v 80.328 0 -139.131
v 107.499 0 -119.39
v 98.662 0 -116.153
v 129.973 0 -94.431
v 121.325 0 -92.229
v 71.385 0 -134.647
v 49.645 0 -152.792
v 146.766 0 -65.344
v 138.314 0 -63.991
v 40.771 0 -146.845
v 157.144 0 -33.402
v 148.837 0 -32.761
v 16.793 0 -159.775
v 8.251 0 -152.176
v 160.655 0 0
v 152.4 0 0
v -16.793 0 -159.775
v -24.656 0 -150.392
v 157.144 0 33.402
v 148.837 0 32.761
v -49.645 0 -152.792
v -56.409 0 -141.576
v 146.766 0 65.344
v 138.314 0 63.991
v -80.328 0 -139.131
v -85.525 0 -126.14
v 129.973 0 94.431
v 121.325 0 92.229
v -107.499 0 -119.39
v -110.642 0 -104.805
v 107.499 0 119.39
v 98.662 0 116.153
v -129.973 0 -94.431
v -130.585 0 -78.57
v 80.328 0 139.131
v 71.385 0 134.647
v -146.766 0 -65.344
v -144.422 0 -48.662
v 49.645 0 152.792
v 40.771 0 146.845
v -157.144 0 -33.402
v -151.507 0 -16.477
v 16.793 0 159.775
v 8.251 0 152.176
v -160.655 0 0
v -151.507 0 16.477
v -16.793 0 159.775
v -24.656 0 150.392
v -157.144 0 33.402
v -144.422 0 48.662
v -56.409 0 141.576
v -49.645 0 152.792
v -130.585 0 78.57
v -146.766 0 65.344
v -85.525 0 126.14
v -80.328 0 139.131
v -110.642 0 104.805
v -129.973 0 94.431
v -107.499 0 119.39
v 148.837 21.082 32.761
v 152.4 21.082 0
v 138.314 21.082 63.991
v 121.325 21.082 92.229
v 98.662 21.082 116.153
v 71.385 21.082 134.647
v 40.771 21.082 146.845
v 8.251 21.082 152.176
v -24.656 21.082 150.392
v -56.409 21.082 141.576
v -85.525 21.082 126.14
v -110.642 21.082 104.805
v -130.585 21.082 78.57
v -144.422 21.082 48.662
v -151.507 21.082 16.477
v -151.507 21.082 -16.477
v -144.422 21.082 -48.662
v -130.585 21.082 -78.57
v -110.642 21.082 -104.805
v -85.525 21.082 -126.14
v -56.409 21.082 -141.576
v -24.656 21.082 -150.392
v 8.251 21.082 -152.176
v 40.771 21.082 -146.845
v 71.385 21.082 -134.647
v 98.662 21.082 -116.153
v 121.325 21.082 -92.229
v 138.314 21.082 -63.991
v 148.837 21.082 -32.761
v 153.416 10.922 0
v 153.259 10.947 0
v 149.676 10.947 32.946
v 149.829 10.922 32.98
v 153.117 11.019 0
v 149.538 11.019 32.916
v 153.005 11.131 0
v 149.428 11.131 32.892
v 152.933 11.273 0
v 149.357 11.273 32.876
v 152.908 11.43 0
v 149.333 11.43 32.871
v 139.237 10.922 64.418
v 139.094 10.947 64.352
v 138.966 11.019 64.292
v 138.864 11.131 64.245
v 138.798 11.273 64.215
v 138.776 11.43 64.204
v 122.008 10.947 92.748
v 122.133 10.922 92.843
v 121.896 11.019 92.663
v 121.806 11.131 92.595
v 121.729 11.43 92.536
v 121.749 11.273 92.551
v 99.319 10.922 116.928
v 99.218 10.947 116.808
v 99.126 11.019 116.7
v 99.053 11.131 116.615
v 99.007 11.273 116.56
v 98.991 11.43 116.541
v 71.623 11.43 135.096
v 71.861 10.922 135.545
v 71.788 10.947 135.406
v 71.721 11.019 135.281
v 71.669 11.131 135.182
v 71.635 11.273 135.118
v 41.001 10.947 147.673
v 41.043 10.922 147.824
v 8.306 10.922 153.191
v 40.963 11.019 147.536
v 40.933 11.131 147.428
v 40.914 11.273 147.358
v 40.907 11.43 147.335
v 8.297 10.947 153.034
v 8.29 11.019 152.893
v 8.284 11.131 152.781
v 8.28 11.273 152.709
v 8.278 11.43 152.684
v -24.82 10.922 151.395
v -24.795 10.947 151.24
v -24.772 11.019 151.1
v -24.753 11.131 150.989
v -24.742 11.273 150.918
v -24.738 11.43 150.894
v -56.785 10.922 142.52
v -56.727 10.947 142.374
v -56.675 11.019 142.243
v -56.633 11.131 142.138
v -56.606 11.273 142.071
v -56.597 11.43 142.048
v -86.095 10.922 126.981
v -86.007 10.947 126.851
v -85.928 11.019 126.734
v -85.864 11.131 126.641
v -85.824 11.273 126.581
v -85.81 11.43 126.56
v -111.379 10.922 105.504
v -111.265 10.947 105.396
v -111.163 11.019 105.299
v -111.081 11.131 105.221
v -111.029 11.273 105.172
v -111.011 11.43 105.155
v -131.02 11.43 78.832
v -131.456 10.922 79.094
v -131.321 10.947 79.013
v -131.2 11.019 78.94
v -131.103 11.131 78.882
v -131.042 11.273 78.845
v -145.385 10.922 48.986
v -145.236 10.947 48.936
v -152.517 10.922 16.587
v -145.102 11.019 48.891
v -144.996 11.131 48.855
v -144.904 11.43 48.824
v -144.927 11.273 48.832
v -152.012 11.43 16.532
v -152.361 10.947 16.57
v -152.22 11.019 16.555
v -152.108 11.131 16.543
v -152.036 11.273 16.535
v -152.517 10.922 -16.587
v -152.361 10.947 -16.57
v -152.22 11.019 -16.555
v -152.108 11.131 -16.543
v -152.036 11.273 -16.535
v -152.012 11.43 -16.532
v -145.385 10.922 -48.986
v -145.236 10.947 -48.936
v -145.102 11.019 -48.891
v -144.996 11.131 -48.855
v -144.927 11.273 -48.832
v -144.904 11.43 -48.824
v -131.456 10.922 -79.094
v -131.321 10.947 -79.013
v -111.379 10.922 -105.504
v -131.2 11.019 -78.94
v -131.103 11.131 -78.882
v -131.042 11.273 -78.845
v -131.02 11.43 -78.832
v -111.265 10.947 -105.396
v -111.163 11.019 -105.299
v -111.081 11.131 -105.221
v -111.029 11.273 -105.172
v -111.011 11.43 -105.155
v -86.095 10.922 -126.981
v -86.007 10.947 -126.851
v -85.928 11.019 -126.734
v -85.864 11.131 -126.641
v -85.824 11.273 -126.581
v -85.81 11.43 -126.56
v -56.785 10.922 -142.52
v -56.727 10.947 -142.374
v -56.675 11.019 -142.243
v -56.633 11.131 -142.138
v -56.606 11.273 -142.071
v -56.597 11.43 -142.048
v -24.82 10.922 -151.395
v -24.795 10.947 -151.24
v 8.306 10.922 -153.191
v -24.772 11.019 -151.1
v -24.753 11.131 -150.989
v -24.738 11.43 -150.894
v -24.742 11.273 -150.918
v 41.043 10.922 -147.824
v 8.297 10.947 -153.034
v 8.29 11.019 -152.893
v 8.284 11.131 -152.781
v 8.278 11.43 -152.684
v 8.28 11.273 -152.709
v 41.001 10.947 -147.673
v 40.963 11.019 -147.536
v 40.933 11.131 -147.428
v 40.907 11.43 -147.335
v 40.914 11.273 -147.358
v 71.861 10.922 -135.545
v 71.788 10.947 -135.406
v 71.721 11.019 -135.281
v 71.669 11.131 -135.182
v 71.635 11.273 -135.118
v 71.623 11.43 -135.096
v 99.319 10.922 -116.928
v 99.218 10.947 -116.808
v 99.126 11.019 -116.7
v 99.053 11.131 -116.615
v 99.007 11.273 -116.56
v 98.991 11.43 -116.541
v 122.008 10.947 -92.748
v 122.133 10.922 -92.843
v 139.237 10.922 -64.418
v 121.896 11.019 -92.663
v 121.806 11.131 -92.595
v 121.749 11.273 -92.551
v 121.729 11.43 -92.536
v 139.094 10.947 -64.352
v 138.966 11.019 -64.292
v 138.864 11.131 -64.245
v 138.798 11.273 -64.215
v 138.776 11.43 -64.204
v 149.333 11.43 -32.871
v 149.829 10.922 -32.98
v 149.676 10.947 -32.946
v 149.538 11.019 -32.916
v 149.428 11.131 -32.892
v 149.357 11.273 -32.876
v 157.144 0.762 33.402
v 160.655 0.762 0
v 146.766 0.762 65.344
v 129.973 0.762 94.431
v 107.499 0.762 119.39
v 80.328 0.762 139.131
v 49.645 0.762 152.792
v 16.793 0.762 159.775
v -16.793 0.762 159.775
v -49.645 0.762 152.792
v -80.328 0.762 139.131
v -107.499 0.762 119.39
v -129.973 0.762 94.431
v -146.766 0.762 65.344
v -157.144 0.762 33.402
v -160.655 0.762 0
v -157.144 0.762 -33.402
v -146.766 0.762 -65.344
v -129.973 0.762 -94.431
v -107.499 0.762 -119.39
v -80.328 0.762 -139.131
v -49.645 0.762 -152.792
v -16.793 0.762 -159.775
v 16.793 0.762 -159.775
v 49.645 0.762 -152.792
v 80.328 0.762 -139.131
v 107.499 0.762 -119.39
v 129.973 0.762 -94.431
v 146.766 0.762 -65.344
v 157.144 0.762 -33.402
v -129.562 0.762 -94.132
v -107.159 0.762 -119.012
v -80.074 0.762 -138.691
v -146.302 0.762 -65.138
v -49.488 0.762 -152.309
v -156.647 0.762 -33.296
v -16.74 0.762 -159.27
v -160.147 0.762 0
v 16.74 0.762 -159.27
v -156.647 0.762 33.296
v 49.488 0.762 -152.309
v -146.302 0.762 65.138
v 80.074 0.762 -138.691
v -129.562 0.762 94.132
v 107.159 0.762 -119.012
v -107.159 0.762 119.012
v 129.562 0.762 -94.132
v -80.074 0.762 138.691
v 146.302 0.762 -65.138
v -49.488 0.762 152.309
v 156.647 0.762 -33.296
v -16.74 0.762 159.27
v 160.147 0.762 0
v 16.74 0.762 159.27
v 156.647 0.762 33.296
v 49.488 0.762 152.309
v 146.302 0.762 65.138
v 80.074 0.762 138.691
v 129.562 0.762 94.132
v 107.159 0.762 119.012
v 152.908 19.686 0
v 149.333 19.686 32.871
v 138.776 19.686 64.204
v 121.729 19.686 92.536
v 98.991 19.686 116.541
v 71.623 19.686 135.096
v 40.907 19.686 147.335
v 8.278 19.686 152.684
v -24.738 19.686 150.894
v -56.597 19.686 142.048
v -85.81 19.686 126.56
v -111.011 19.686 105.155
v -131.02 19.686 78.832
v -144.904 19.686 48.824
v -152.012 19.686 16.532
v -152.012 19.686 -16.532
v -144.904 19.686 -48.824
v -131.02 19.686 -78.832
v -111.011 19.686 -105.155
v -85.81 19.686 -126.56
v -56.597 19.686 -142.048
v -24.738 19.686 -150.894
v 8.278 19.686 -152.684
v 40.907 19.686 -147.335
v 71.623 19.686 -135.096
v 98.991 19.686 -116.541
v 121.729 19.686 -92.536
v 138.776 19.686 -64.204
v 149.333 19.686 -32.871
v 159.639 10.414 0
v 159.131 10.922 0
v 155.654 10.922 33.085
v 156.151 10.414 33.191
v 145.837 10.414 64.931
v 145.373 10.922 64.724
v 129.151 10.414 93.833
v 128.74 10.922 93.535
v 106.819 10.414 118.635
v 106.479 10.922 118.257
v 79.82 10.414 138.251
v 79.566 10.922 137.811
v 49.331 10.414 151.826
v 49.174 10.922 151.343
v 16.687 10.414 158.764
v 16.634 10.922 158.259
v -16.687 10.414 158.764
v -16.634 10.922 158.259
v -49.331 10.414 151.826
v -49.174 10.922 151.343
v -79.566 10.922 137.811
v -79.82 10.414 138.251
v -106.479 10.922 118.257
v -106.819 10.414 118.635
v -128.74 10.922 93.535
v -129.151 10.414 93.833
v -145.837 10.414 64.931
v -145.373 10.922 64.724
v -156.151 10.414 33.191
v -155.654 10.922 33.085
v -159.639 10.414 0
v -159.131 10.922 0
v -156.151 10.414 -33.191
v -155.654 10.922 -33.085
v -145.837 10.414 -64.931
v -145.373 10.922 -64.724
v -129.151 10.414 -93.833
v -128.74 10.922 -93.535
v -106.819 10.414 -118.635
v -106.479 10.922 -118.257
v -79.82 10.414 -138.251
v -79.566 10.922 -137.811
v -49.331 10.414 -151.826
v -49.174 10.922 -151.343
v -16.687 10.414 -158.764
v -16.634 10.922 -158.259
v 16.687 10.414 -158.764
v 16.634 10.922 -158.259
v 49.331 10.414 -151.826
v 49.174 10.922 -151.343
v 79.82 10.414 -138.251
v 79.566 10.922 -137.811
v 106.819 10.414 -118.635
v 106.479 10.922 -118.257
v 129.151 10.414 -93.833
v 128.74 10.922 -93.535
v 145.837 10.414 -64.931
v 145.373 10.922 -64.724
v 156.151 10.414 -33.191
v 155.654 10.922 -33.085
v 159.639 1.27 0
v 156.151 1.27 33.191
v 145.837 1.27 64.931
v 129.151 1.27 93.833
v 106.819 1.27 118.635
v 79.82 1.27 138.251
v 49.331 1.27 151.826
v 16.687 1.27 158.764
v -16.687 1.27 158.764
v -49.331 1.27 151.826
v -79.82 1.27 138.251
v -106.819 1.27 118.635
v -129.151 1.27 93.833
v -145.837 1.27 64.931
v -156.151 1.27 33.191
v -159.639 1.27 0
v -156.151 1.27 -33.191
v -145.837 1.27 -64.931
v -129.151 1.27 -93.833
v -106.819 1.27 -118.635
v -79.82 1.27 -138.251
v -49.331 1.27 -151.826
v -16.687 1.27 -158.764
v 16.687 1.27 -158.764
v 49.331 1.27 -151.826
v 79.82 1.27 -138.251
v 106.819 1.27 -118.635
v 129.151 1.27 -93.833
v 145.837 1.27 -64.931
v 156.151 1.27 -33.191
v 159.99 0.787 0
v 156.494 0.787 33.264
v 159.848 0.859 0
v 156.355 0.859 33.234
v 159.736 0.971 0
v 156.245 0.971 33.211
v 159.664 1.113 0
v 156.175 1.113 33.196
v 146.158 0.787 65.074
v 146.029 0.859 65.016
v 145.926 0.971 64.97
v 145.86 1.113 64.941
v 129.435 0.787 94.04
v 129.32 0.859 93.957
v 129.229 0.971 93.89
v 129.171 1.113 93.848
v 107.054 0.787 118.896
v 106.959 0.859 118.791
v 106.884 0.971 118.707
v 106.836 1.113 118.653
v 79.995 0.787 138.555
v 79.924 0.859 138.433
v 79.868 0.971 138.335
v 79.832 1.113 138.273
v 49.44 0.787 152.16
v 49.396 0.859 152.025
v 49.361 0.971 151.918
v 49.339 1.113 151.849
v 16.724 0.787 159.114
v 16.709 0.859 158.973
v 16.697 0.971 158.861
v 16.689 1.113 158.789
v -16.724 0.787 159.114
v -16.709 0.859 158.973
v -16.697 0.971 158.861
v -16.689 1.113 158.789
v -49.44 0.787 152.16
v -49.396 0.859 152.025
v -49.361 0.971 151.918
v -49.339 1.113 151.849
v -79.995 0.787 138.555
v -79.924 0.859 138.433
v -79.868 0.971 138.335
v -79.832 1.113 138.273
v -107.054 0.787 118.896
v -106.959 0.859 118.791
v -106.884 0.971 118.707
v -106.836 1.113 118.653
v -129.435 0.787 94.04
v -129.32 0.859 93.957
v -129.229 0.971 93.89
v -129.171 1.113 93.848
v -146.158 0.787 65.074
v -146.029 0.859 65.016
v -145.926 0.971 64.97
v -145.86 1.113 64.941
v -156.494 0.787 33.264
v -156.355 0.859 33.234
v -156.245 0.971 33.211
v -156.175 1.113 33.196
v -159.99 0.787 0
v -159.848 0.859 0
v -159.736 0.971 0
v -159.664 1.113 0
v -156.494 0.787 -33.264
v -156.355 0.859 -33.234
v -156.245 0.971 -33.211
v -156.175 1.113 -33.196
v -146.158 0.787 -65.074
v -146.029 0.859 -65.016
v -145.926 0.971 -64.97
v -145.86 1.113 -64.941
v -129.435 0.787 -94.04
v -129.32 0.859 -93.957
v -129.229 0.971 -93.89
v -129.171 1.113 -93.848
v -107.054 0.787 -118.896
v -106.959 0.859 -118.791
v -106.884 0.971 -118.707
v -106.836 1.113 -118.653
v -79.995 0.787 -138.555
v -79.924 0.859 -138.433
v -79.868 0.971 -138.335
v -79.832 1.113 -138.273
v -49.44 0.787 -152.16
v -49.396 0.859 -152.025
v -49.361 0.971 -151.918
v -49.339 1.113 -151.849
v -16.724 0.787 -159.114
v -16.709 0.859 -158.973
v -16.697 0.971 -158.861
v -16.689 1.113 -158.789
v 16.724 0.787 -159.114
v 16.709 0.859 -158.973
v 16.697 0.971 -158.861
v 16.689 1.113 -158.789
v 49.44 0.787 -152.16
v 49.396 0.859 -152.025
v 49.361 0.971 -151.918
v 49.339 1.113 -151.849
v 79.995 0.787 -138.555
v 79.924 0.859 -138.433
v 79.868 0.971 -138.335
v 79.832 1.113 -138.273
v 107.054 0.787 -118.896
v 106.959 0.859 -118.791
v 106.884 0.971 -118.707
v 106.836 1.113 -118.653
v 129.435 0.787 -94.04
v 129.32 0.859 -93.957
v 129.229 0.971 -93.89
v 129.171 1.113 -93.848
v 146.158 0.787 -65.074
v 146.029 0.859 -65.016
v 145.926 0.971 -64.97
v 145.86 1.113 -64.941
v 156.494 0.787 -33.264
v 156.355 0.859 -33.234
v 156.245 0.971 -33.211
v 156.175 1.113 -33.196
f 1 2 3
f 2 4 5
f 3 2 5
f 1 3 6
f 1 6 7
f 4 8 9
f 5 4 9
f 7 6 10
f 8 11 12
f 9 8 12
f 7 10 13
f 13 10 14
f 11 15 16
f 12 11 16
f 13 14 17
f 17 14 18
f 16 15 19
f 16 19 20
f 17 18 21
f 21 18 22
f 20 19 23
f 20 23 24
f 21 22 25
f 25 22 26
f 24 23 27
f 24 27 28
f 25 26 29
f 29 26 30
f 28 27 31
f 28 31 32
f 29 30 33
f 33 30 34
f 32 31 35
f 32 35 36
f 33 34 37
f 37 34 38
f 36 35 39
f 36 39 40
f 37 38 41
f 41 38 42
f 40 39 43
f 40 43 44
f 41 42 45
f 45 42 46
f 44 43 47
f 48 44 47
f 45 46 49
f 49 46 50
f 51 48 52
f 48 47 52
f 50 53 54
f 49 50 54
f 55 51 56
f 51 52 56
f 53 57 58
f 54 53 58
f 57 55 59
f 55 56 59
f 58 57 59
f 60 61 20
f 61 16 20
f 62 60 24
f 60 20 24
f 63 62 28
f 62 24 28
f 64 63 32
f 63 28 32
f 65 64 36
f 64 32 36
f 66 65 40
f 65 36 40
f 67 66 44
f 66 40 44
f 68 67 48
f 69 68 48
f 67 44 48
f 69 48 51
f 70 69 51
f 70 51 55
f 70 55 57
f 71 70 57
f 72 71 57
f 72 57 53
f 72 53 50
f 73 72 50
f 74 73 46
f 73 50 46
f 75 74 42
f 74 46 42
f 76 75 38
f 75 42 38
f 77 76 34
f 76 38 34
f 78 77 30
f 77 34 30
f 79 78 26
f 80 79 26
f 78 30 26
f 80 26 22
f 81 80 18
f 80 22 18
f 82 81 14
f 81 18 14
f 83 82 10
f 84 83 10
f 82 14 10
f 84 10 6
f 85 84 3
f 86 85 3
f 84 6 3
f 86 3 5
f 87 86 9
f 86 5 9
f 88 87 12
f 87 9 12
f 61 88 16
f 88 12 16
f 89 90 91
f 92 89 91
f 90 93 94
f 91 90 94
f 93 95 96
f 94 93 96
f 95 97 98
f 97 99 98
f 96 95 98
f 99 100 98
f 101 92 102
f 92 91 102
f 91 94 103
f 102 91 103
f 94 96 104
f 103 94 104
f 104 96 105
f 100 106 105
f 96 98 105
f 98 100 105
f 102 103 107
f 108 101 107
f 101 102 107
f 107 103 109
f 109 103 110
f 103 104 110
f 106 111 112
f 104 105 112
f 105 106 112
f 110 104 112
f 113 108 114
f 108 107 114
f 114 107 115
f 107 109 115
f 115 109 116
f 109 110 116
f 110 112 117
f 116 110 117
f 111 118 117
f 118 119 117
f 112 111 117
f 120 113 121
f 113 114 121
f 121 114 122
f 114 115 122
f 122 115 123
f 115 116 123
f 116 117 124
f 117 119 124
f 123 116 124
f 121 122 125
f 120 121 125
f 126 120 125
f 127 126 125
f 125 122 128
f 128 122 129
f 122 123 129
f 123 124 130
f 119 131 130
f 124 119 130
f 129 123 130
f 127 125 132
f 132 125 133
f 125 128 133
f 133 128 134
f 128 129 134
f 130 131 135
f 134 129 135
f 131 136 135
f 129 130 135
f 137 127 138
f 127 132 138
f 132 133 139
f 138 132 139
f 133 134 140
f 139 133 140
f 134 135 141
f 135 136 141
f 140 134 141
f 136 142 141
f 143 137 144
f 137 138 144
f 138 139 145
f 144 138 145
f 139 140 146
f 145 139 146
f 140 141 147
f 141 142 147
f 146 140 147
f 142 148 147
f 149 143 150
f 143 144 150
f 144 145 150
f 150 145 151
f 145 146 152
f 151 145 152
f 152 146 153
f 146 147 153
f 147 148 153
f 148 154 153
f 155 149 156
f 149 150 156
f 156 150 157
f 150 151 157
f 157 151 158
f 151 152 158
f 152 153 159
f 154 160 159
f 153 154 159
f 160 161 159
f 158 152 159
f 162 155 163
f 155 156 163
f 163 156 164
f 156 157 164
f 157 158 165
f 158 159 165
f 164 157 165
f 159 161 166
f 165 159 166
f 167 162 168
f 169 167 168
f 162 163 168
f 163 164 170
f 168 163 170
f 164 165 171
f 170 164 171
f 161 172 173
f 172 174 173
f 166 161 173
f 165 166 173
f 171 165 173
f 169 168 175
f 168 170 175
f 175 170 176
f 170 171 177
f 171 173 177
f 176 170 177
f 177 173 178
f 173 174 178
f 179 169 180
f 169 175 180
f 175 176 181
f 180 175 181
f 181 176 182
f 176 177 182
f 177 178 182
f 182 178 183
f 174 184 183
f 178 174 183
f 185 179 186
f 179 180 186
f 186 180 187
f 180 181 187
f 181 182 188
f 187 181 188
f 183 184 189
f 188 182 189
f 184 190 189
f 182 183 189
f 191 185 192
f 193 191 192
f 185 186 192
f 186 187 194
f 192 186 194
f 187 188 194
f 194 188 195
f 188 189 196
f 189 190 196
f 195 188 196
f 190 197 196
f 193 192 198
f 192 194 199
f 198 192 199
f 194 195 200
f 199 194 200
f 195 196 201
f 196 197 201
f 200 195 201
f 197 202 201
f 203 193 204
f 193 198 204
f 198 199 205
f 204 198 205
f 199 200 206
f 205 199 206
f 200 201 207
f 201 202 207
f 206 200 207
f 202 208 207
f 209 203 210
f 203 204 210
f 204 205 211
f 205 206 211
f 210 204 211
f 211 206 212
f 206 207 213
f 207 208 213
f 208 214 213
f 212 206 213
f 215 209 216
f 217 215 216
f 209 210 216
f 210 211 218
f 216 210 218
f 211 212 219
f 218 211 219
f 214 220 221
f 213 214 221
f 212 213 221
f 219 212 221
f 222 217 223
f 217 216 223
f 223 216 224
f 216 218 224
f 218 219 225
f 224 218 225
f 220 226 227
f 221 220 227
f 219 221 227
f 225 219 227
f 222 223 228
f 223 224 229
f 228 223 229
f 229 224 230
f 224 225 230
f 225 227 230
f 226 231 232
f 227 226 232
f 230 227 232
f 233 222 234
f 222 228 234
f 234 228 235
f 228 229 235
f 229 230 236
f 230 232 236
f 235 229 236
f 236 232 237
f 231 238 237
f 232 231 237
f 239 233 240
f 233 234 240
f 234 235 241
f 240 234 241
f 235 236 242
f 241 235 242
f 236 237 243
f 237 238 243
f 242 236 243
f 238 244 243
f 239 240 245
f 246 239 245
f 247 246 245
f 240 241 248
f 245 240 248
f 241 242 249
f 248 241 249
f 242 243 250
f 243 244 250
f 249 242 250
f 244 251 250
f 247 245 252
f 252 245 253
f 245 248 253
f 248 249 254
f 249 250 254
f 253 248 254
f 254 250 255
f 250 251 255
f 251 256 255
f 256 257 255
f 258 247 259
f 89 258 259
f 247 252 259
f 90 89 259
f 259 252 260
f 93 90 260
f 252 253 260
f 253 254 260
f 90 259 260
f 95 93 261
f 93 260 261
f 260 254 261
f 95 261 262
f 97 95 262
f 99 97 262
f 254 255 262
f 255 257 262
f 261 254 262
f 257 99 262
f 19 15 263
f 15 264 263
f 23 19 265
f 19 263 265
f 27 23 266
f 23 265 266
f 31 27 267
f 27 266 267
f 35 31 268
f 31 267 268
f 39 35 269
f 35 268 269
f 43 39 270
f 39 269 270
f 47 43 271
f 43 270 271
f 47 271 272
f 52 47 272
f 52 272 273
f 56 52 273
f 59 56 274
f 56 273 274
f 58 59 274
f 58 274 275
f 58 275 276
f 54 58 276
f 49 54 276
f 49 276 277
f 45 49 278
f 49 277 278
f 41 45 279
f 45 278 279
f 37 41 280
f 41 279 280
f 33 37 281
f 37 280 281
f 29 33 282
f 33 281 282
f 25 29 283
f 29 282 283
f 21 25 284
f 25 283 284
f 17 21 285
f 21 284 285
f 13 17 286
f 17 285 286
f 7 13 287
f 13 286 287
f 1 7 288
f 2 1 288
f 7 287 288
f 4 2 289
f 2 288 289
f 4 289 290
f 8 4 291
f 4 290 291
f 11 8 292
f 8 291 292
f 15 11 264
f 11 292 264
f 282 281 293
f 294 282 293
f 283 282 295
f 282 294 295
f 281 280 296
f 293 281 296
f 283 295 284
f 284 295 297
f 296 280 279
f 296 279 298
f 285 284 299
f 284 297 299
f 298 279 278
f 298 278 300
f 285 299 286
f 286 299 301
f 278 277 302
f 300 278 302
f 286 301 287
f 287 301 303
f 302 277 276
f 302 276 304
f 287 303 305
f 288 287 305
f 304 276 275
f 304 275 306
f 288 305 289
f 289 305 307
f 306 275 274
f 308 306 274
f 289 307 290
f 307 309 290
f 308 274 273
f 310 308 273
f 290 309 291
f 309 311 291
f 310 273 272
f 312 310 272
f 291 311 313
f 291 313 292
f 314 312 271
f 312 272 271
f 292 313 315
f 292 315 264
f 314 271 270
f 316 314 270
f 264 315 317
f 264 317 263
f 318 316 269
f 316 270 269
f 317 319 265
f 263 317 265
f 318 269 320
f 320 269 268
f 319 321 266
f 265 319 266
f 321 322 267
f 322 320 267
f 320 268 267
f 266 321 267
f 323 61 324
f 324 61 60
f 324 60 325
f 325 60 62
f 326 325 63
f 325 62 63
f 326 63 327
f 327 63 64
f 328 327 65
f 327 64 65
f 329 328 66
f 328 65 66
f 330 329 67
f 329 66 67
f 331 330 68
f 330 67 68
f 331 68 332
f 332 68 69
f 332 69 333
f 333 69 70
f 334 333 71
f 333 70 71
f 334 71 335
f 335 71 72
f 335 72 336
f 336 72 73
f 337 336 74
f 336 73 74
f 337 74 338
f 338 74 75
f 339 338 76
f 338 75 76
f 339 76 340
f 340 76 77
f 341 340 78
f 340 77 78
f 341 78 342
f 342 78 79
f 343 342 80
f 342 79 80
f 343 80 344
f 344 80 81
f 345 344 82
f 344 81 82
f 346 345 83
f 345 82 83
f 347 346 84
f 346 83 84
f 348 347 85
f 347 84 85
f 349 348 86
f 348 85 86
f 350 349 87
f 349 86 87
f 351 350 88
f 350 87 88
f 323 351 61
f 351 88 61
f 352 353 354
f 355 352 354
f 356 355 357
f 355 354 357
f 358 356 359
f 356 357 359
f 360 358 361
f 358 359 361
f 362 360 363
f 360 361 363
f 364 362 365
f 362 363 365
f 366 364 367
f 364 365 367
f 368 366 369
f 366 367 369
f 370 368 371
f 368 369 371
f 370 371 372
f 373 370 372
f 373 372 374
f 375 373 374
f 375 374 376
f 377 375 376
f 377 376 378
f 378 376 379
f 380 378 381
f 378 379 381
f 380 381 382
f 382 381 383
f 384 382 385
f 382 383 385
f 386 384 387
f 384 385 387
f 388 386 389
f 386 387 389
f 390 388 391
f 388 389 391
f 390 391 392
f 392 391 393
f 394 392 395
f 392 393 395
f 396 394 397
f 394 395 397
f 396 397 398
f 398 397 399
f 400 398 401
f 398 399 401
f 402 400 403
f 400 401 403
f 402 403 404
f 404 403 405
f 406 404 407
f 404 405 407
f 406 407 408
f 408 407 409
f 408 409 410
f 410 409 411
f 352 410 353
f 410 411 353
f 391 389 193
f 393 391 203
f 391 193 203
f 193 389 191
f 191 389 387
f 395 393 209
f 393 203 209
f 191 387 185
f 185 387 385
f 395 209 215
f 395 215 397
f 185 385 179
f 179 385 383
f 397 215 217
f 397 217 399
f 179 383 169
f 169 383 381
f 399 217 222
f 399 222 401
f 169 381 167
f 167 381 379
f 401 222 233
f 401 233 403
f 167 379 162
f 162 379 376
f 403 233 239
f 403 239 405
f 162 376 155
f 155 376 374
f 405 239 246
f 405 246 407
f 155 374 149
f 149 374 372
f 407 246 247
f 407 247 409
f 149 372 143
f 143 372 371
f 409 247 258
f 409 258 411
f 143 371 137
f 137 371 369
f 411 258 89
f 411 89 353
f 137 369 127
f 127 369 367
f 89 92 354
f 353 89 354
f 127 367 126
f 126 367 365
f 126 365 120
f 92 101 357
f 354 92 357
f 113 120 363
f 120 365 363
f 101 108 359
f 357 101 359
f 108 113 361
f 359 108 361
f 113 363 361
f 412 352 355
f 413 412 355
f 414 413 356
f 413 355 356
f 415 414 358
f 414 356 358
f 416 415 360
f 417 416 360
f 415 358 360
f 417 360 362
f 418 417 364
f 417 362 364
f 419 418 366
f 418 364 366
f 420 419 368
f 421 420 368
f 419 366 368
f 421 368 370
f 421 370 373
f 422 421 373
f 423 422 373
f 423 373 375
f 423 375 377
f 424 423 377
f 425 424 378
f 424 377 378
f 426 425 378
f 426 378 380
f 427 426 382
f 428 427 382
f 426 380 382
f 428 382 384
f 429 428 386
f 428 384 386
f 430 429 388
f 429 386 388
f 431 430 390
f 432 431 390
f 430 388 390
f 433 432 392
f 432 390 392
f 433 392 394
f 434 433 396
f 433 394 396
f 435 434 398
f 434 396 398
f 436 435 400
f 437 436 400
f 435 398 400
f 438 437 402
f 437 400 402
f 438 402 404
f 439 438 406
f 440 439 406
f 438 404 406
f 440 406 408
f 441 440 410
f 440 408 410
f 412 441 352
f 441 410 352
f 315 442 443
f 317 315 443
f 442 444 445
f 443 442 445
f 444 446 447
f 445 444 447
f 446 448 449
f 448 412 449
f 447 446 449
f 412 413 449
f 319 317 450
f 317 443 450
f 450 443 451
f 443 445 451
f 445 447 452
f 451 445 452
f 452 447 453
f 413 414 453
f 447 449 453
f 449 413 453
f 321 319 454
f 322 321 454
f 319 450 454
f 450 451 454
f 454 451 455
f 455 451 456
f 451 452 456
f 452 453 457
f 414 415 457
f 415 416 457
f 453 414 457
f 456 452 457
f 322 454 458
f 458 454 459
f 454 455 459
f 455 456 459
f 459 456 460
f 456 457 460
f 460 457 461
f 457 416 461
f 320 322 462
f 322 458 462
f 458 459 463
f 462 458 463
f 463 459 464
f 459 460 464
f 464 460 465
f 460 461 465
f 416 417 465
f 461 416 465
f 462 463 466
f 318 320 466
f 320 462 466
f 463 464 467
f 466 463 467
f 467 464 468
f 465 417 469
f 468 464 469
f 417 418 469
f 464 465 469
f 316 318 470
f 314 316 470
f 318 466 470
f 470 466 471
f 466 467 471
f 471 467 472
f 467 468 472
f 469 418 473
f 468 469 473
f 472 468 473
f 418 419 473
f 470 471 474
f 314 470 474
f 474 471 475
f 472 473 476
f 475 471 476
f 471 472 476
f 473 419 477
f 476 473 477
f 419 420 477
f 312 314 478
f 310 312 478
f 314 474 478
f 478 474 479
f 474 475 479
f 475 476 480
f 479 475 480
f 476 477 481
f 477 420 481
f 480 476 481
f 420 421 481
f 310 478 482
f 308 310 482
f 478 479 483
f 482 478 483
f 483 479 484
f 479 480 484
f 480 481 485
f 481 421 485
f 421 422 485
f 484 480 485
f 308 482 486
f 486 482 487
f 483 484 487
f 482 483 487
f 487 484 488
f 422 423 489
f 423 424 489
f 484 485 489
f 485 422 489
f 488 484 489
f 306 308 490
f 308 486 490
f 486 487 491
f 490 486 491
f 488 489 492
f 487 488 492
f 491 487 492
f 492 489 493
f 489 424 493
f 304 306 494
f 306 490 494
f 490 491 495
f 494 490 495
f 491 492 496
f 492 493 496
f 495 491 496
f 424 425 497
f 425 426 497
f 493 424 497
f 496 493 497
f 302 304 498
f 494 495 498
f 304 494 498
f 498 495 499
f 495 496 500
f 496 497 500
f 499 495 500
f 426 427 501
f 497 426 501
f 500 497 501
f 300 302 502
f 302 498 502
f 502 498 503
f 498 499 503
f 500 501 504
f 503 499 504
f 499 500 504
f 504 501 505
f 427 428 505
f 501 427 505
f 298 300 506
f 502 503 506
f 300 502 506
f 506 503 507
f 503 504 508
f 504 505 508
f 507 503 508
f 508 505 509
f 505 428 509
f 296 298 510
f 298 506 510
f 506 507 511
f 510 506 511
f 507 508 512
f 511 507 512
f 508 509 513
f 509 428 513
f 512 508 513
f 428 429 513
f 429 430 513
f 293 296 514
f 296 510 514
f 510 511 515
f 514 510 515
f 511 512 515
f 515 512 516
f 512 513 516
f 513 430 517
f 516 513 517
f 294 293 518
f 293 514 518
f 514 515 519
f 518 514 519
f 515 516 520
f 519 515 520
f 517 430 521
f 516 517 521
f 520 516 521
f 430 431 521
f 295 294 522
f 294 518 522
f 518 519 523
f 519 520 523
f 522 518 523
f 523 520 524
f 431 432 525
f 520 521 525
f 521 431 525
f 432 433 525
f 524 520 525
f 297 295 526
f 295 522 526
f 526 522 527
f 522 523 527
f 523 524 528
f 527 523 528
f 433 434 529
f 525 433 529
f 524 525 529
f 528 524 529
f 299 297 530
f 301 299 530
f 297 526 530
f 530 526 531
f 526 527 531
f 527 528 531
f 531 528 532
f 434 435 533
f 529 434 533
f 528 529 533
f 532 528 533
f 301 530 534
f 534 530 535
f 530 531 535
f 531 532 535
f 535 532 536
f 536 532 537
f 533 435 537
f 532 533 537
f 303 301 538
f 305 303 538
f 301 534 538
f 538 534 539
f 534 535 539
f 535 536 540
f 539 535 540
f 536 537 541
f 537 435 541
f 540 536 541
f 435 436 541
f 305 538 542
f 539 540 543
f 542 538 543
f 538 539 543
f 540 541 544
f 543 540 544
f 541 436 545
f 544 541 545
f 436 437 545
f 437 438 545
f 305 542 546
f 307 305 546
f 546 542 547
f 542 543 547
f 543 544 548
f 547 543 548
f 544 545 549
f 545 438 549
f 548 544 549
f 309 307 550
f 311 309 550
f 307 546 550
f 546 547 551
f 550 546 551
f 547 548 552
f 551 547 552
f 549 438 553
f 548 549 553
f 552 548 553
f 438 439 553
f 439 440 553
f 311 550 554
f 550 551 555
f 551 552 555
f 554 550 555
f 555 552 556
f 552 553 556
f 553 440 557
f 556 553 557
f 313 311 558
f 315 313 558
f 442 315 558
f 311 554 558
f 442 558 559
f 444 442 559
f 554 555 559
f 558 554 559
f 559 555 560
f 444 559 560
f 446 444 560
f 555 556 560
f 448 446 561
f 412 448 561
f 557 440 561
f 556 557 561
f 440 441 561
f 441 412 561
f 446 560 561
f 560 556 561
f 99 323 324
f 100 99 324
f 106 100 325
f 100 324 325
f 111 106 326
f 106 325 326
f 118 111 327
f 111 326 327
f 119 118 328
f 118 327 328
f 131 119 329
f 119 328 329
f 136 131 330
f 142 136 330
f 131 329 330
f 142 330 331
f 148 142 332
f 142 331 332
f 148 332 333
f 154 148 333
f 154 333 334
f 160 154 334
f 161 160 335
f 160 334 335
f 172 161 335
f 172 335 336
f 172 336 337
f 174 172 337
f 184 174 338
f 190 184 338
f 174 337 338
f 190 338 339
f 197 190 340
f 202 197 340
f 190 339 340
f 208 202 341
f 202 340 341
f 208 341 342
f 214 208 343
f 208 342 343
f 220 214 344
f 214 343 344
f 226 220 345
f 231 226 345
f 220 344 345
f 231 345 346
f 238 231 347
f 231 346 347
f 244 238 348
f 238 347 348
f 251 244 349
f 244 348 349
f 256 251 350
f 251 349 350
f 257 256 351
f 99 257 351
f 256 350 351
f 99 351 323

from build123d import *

# Parameters (mm, degrees)
FILLET1_R     = 0.508
CHAMFER1_SIZE = 0.508


with BuildPart() as part:
    # Sketch1 → Revolve1 (revolve)
    with BuildSketch(Plane.XY):
        Polygon((152.4, 21.082), (152.4, 0), (160.655, 0), (160.655, 0.762), (159.639, 0.762), (159.639, 10.922), (152.908, 10.922), (152.908, 19.686281471), align=None)
    revolve(axis=Axis((0, 28.738956579, 0), (0, -1, 0)))

    # Fillet1
    fillet1_edges = [part.edges().sort_by_distance(p)[0] for p in [
        (-159.639, 0.762, 0),
        (-152.908, 10.922, 0),
    ]]
    fillet(fillet1_edges, radius=FILLET1_R)

    # Chamfer1
    chamfer1_edges = [part.edges().sort_by_distance(p)[0] for p in [
        (-159.639, 10.922, 0),
    ]]
    chamfer(chamfer1_edges, length=CHAMFER1_SIZE)


solid = part.part
